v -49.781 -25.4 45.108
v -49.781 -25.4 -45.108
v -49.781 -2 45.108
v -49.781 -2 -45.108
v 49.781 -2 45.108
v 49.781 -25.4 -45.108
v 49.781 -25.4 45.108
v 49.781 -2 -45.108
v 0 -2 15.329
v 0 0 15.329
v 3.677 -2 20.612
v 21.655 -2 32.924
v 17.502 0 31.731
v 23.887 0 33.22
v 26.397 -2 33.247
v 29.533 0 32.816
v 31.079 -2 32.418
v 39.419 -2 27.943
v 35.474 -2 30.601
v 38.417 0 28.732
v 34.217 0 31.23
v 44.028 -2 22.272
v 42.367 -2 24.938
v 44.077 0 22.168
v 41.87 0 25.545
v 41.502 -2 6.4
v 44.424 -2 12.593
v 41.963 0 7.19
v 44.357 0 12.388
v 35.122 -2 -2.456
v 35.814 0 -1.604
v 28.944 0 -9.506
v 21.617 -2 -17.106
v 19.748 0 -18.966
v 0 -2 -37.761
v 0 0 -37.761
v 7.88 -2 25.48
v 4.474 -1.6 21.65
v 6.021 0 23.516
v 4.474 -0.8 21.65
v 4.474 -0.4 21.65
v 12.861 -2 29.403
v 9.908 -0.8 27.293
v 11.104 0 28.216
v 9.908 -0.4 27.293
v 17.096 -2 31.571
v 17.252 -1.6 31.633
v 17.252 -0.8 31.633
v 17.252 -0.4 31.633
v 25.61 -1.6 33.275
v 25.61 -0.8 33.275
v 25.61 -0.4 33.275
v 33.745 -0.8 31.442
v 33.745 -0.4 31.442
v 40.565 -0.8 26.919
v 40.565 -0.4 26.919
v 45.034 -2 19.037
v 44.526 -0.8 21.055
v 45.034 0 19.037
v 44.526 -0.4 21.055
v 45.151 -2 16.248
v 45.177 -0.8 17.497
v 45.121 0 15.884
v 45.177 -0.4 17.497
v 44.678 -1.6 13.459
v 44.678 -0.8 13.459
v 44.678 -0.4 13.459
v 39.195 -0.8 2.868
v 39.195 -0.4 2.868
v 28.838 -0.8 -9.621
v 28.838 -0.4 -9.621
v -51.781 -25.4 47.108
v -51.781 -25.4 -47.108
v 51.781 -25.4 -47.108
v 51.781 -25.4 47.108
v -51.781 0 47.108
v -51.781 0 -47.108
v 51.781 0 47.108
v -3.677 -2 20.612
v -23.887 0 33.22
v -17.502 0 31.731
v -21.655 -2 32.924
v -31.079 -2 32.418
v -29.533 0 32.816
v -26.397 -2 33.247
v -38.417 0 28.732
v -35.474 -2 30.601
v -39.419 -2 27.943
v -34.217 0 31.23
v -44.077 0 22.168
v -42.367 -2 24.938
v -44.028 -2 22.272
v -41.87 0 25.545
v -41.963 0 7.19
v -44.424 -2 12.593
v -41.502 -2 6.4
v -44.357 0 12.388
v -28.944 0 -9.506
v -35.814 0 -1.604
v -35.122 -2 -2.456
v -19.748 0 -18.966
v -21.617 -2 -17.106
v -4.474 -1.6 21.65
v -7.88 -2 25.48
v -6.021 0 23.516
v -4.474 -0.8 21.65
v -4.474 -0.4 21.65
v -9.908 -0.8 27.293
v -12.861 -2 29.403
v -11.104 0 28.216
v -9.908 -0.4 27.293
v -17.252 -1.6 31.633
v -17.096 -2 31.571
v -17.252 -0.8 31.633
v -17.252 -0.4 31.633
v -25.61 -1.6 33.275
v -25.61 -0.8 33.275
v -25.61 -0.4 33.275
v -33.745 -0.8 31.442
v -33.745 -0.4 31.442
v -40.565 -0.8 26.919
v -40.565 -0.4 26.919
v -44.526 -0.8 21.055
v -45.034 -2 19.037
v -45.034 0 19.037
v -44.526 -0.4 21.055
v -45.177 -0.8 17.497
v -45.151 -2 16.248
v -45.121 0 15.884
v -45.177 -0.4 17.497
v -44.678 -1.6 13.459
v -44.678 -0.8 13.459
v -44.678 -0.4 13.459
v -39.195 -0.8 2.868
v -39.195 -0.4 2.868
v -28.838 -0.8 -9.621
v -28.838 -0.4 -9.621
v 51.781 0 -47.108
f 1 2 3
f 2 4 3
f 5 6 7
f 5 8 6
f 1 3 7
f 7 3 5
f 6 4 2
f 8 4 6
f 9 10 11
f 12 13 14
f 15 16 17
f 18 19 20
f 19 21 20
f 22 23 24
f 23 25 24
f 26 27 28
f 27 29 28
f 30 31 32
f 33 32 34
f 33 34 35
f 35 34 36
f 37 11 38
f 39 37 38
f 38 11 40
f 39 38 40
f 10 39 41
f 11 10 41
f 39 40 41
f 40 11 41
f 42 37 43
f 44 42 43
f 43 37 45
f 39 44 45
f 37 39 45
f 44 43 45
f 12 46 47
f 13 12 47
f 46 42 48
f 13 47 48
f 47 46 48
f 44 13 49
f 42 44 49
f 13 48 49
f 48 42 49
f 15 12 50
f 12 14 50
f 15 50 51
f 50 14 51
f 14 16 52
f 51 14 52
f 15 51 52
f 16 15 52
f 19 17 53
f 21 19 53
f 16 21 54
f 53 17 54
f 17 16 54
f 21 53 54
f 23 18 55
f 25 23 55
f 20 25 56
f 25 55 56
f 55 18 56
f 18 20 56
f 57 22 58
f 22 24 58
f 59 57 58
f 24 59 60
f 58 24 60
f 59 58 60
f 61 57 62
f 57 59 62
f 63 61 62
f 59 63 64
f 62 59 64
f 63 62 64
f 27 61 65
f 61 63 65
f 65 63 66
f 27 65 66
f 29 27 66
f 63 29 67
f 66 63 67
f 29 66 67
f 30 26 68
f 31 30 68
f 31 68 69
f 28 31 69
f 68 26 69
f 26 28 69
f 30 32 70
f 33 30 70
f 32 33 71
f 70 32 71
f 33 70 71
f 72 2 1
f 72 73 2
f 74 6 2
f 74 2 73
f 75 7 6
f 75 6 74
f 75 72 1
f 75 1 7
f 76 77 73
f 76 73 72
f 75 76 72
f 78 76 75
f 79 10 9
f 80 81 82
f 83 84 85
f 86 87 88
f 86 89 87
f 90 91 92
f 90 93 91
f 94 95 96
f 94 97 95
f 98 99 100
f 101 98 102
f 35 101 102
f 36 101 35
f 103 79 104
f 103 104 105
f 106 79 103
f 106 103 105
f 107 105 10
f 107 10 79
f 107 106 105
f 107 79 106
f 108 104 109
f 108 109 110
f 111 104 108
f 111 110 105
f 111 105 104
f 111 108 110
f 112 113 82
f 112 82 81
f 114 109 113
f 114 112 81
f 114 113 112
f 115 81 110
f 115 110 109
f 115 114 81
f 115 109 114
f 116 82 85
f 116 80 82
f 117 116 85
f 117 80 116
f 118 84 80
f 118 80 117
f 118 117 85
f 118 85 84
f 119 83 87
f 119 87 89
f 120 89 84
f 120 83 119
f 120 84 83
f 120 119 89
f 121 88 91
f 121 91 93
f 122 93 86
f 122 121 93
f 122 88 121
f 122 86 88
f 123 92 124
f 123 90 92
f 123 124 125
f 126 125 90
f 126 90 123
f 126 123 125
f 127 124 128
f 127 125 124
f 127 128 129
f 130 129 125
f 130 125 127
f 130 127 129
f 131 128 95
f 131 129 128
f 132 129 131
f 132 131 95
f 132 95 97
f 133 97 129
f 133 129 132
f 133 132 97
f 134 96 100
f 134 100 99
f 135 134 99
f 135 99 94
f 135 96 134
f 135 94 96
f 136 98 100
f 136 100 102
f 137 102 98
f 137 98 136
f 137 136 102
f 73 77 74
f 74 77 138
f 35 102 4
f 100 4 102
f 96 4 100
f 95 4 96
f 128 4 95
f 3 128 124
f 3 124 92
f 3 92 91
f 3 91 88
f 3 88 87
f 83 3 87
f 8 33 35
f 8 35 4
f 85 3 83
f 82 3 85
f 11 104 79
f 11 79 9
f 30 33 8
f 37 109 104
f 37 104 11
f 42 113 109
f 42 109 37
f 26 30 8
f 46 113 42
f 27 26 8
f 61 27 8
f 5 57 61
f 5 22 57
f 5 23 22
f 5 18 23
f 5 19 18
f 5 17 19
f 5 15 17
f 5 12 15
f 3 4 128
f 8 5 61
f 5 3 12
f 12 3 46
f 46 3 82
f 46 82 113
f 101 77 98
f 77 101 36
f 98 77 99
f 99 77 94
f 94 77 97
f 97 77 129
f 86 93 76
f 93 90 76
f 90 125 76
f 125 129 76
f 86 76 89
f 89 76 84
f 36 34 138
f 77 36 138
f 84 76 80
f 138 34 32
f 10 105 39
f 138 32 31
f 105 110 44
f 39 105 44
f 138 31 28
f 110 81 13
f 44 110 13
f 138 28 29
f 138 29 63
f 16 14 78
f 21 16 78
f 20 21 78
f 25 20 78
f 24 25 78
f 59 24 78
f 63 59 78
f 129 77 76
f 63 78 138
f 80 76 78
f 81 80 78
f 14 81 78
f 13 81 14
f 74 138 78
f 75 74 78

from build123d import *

# Parameters (mm, degrees)
F0_W     = 103.5625115037
F0_H     = 94.215720892
F1_DEPTH = 25.4
F2_T     = -2
F4_DEPTH = 25.4


with BuildPart() as f1:
    # F0 (on Front) → F1 (new body)
    with BuildSketch(Plane.XZ):
        Rectangle(F0_W, F0_H)
    extrude(amount=F1_DEPTH)

    # F2
    f2_openings = [f1.faces().sort_by_distance(p)[0] for p in [
        (0, -25.4, 0),
    ]]
    offset(amount=F2_T, openings=f2_openings)

    # F3 (on face) → F4 (cut)
    with BuildSketch(Plane(origin=(0, 0, 0), x_dir=(-1, 0, 0), z_dir=(0, 1, 0))):
        with BuildLine():
            add(Edge.make_bspline(
                [(0, 15.3287509456), (2.8759838488, 19.61843277), (8.7431875053, 28.3696769384), (25.5477306115, 35.8525990524), (41.9020528727, 28.1543589695), (50.7457146307, 9.6766957358), (20.6699938695, -18.438481617), (0, -37.7610623837)],
                knots=[0, 0, 0, 0, 0.1637608356, 0.3340832995, 0.5015745629, 0.6574495816, 1, 1, 1, 1], degree=3))
            add(Edge.make_bspline(
                [(0, 15.3287509456), (-2.8759838488, 19.61843277), (-8.7431875053, 28.3696769384), (-25.5477306115, 35.8525990524), (-41.9020528727, 28.1543589695), (-50.7457146307, 9.6766957358), (-20.6699938695, -18.438481617), (0, -37.7610623837)],
                knots=[0, 0, 0, 0, 0.1637608356, 0.3340832995, 0.5015745629, 0.6574495816, 1, 1, 1, 1], degree=3))
        make_face()
    extrude(amount=-F4_DEPTH, mode=Mode.SUBTRACT)


solid = f1.part
